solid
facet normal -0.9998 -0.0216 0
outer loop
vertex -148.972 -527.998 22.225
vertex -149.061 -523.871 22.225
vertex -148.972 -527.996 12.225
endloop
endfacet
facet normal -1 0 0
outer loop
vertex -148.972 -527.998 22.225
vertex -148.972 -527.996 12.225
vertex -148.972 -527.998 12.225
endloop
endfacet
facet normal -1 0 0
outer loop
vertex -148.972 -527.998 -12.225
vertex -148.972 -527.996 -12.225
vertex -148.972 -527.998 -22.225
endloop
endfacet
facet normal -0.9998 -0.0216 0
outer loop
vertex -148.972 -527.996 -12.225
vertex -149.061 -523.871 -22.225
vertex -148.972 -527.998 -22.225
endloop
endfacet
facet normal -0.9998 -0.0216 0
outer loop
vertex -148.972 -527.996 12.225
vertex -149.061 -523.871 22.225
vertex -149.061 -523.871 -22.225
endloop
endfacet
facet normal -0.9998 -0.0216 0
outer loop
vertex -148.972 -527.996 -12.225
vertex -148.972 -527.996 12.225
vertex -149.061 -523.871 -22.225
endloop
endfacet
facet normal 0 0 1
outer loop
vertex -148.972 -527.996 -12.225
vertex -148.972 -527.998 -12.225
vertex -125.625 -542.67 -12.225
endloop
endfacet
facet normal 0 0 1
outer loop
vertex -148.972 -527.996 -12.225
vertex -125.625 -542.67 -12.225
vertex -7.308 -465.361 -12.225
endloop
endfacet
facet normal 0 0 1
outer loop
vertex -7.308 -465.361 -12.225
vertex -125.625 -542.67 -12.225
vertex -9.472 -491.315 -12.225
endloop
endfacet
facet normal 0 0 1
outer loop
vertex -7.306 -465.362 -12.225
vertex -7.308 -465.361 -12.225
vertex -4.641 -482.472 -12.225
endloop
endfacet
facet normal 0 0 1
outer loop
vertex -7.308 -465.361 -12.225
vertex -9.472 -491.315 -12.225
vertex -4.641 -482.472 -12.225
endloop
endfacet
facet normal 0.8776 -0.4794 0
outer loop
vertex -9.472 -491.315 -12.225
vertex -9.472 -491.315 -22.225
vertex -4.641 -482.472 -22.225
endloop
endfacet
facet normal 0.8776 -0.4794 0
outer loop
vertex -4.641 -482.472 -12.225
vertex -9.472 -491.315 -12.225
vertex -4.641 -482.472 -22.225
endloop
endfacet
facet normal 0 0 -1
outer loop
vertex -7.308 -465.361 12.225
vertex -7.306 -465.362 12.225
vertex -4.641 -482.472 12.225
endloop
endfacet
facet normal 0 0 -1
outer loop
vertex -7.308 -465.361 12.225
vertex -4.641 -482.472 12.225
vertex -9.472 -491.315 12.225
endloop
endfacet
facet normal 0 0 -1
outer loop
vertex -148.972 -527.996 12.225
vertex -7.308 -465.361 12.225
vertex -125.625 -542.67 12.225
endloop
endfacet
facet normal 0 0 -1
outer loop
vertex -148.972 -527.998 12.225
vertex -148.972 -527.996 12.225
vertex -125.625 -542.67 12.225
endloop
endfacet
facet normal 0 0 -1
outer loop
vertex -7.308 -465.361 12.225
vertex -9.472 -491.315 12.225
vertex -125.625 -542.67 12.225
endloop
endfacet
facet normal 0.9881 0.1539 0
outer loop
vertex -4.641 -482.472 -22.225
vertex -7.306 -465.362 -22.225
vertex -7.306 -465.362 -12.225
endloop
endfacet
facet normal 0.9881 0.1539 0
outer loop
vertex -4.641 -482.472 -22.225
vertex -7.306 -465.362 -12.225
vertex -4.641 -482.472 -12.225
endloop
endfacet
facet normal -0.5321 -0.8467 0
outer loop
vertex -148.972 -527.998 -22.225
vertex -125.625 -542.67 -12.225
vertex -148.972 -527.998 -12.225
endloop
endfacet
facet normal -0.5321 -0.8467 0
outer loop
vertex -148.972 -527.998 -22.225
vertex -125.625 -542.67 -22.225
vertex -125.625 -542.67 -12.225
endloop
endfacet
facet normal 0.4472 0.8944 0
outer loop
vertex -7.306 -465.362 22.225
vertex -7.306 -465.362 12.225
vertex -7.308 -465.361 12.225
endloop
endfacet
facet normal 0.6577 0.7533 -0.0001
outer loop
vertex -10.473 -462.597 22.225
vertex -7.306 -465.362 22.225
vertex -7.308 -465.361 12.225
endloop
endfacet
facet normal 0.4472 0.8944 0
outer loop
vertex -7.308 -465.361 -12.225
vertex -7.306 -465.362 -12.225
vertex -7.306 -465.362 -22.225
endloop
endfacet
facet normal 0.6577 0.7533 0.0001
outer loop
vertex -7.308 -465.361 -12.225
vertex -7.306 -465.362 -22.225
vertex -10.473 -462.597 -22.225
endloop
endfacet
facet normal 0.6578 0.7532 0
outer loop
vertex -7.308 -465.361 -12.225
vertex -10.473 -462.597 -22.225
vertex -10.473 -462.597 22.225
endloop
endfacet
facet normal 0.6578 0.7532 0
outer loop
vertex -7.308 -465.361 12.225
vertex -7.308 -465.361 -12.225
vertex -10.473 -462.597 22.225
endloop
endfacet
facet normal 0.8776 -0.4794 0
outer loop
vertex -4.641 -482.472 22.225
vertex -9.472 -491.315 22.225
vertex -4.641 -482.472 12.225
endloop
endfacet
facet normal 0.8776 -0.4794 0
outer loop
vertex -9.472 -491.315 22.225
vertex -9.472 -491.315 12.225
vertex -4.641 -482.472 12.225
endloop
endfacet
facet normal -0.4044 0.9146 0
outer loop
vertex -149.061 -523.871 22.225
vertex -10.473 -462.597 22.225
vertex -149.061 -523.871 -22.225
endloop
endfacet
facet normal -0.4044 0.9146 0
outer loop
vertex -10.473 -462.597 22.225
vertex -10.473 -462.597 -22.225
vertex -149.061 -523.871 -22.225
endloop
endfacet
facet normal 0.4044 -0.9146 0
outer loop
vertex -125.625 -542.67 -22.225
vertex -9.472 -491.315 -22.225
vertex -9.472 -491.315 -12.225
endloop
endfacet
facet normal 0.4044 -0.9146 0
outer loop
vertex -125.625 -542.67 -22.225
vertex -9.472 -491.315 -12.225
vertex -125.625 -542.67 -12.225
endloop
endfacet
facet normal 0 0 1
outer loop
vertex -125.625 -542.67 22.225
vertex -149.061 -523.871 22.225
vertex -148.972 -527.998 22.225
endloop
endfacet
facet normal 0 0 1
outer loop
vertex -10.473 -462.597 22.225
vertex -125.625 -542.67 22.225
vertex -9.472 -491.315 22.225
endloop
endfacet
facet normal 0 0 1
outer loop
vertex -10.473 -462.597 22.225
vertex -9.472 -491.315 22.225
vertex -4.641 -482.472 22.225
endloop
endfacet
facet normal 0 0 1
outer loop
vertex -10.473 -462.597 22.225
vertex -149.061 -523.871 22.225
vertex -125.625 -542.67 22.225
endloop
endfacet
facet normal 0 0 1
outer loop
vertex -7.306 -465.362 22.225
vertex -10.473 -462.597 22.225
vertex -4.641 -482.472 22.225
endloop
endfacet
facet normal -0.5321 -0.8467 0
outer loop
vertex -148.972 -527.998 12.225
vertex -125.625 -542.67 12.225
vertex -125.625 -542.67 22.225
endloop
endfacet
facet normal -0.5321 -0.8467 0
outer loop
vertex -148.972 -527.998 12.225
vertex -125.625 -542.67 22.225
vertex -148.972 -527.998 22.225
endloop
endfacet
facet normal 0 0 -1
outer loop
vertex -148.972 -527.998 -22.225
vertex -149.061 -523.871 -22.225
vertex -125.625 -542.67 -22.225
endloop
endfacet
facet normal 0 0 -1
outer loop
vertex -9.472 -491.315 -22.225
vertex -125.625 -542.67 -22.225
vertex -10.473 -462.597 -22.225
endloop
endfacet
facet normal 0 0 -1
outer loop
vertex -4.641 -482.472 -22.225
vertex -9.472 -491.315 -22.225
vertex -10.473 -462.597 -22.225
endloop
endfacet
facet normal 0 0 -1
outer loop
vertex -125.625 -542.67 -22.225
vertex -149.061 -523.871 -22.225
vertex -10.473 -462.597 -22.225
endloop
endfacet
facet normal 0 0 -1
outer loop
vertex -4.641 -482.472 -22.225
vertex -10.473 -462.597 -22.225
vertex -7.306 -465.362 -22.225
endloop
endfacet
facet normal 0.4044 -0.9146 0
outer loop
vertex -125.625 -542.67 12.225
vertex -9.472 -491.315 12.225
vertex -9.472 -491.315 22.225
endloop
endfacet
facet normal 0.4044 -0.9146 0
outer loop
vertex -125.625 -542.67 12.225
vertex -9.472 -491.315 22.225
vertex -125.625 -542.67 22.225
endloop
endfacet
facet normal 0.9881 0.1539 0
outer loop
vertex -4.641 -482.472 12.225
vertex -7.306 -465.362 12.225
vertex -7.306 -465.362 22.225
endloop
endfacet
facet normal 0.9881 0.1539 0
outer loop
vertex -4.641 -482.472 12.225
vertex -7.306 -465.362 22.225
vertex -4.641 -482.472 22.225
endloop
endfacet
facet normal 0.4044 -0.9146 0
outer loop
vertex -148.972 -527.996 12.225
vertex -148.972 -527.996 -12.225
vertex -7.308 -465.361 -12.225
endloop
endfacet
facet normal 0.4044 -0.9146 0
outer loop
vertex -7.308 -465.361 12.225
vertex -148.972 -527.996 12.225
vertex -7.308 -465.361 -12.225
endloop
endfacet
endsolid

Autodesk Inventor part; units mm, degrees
ref_plane "YZ Plane" through (0, 0, 0) normal (1, 0, 0) x (0, 1, 0)
ref_plane "XZ Plane" through (0, 0, 0) normal (0, 1, 0) x (-1, 0, 0)
sketch "Sketch1" plane through (0, 0, 0) normal (0, 0, 1) x (1, 0, 0)
  line L0 (-7.3059, -465.3624) -> (-4.6413, -482.4725)
  line L1 (-9.4718, -491.3147) -> (-125.6251, -542.6703)
  line L2 (-125.6251, -542.6703) -> (-148.9715, -527.9978)
  line L3 (-148.9715, -527.9978) -> (-7.3059, -465.3624) construction
  line L4 (-7.3059, -465.3624) -> (-10.4732, -462.5969)
  line L5 (-10.4732, -462.5969) -> (-149.0606, -523.8714)
  line L6 (-149.0606, -523.8714) -> (-148.9715, -527.9978)
  line L7 (-9.4718, -491.3147) -> (-4.6413, -482.4725)
  point P0 (0, 0)
  point P1 (-3.6641, -488.7469)
  dimension "d3" = 3.81
  dimension "d6" = 133.35
  dimension "d8" = 6.35
  dimension "d9" = 6.35
extrude "Extrusion1" add sketch "Sketch1" along normal mid plane 44.45
sketch "Sketch2" plane through (-138.2759, -548.2636, 22.225) normal (-0.4043748, 0.9145934, 0) x (0.9145934, 0.4043748, 0)
  line L0 (-1.5872, 10) -> (153.3074, 10) construction
  line L1 (153.3074, 34.45) -> (-1.5872, 34.45) construction
  line L2 (163.3576, 10) -> (-32.3991, 10)
  line L3 (-32.3991, 10) -> (-32.3991, 34.45)
  line L4 (-32.3991, 34.45) -> (163.3576, 34.45)
  line L5 (163.3576, 34.45) -> (163.3576, 10)
  line L6 (163.3576, 6.0918) -> (163.3576, 38.3582) construction
  line L7 (-32.3991, 3.3518) -> (-32.3991, 41.0982) construction
  point P0 (348.1702, 22.225)
ref_plane "Work Plane1" through (-188.0551, -545.2781, -26.8885) normal (-0.4043748, 0.9145934, 0) x (0, 0, 1)
extrude "Extrusion2" cut sketch "Sketch2" along normal up to surface (22.86 mm away)
sketch "Sketch4" plane through (0, 0, 0) normal (0, 0, 1) x (1, 0, 0)
  point P0 (0, 0)
equation "\"d9\" = d8"
properties part number "BottomGrip"
